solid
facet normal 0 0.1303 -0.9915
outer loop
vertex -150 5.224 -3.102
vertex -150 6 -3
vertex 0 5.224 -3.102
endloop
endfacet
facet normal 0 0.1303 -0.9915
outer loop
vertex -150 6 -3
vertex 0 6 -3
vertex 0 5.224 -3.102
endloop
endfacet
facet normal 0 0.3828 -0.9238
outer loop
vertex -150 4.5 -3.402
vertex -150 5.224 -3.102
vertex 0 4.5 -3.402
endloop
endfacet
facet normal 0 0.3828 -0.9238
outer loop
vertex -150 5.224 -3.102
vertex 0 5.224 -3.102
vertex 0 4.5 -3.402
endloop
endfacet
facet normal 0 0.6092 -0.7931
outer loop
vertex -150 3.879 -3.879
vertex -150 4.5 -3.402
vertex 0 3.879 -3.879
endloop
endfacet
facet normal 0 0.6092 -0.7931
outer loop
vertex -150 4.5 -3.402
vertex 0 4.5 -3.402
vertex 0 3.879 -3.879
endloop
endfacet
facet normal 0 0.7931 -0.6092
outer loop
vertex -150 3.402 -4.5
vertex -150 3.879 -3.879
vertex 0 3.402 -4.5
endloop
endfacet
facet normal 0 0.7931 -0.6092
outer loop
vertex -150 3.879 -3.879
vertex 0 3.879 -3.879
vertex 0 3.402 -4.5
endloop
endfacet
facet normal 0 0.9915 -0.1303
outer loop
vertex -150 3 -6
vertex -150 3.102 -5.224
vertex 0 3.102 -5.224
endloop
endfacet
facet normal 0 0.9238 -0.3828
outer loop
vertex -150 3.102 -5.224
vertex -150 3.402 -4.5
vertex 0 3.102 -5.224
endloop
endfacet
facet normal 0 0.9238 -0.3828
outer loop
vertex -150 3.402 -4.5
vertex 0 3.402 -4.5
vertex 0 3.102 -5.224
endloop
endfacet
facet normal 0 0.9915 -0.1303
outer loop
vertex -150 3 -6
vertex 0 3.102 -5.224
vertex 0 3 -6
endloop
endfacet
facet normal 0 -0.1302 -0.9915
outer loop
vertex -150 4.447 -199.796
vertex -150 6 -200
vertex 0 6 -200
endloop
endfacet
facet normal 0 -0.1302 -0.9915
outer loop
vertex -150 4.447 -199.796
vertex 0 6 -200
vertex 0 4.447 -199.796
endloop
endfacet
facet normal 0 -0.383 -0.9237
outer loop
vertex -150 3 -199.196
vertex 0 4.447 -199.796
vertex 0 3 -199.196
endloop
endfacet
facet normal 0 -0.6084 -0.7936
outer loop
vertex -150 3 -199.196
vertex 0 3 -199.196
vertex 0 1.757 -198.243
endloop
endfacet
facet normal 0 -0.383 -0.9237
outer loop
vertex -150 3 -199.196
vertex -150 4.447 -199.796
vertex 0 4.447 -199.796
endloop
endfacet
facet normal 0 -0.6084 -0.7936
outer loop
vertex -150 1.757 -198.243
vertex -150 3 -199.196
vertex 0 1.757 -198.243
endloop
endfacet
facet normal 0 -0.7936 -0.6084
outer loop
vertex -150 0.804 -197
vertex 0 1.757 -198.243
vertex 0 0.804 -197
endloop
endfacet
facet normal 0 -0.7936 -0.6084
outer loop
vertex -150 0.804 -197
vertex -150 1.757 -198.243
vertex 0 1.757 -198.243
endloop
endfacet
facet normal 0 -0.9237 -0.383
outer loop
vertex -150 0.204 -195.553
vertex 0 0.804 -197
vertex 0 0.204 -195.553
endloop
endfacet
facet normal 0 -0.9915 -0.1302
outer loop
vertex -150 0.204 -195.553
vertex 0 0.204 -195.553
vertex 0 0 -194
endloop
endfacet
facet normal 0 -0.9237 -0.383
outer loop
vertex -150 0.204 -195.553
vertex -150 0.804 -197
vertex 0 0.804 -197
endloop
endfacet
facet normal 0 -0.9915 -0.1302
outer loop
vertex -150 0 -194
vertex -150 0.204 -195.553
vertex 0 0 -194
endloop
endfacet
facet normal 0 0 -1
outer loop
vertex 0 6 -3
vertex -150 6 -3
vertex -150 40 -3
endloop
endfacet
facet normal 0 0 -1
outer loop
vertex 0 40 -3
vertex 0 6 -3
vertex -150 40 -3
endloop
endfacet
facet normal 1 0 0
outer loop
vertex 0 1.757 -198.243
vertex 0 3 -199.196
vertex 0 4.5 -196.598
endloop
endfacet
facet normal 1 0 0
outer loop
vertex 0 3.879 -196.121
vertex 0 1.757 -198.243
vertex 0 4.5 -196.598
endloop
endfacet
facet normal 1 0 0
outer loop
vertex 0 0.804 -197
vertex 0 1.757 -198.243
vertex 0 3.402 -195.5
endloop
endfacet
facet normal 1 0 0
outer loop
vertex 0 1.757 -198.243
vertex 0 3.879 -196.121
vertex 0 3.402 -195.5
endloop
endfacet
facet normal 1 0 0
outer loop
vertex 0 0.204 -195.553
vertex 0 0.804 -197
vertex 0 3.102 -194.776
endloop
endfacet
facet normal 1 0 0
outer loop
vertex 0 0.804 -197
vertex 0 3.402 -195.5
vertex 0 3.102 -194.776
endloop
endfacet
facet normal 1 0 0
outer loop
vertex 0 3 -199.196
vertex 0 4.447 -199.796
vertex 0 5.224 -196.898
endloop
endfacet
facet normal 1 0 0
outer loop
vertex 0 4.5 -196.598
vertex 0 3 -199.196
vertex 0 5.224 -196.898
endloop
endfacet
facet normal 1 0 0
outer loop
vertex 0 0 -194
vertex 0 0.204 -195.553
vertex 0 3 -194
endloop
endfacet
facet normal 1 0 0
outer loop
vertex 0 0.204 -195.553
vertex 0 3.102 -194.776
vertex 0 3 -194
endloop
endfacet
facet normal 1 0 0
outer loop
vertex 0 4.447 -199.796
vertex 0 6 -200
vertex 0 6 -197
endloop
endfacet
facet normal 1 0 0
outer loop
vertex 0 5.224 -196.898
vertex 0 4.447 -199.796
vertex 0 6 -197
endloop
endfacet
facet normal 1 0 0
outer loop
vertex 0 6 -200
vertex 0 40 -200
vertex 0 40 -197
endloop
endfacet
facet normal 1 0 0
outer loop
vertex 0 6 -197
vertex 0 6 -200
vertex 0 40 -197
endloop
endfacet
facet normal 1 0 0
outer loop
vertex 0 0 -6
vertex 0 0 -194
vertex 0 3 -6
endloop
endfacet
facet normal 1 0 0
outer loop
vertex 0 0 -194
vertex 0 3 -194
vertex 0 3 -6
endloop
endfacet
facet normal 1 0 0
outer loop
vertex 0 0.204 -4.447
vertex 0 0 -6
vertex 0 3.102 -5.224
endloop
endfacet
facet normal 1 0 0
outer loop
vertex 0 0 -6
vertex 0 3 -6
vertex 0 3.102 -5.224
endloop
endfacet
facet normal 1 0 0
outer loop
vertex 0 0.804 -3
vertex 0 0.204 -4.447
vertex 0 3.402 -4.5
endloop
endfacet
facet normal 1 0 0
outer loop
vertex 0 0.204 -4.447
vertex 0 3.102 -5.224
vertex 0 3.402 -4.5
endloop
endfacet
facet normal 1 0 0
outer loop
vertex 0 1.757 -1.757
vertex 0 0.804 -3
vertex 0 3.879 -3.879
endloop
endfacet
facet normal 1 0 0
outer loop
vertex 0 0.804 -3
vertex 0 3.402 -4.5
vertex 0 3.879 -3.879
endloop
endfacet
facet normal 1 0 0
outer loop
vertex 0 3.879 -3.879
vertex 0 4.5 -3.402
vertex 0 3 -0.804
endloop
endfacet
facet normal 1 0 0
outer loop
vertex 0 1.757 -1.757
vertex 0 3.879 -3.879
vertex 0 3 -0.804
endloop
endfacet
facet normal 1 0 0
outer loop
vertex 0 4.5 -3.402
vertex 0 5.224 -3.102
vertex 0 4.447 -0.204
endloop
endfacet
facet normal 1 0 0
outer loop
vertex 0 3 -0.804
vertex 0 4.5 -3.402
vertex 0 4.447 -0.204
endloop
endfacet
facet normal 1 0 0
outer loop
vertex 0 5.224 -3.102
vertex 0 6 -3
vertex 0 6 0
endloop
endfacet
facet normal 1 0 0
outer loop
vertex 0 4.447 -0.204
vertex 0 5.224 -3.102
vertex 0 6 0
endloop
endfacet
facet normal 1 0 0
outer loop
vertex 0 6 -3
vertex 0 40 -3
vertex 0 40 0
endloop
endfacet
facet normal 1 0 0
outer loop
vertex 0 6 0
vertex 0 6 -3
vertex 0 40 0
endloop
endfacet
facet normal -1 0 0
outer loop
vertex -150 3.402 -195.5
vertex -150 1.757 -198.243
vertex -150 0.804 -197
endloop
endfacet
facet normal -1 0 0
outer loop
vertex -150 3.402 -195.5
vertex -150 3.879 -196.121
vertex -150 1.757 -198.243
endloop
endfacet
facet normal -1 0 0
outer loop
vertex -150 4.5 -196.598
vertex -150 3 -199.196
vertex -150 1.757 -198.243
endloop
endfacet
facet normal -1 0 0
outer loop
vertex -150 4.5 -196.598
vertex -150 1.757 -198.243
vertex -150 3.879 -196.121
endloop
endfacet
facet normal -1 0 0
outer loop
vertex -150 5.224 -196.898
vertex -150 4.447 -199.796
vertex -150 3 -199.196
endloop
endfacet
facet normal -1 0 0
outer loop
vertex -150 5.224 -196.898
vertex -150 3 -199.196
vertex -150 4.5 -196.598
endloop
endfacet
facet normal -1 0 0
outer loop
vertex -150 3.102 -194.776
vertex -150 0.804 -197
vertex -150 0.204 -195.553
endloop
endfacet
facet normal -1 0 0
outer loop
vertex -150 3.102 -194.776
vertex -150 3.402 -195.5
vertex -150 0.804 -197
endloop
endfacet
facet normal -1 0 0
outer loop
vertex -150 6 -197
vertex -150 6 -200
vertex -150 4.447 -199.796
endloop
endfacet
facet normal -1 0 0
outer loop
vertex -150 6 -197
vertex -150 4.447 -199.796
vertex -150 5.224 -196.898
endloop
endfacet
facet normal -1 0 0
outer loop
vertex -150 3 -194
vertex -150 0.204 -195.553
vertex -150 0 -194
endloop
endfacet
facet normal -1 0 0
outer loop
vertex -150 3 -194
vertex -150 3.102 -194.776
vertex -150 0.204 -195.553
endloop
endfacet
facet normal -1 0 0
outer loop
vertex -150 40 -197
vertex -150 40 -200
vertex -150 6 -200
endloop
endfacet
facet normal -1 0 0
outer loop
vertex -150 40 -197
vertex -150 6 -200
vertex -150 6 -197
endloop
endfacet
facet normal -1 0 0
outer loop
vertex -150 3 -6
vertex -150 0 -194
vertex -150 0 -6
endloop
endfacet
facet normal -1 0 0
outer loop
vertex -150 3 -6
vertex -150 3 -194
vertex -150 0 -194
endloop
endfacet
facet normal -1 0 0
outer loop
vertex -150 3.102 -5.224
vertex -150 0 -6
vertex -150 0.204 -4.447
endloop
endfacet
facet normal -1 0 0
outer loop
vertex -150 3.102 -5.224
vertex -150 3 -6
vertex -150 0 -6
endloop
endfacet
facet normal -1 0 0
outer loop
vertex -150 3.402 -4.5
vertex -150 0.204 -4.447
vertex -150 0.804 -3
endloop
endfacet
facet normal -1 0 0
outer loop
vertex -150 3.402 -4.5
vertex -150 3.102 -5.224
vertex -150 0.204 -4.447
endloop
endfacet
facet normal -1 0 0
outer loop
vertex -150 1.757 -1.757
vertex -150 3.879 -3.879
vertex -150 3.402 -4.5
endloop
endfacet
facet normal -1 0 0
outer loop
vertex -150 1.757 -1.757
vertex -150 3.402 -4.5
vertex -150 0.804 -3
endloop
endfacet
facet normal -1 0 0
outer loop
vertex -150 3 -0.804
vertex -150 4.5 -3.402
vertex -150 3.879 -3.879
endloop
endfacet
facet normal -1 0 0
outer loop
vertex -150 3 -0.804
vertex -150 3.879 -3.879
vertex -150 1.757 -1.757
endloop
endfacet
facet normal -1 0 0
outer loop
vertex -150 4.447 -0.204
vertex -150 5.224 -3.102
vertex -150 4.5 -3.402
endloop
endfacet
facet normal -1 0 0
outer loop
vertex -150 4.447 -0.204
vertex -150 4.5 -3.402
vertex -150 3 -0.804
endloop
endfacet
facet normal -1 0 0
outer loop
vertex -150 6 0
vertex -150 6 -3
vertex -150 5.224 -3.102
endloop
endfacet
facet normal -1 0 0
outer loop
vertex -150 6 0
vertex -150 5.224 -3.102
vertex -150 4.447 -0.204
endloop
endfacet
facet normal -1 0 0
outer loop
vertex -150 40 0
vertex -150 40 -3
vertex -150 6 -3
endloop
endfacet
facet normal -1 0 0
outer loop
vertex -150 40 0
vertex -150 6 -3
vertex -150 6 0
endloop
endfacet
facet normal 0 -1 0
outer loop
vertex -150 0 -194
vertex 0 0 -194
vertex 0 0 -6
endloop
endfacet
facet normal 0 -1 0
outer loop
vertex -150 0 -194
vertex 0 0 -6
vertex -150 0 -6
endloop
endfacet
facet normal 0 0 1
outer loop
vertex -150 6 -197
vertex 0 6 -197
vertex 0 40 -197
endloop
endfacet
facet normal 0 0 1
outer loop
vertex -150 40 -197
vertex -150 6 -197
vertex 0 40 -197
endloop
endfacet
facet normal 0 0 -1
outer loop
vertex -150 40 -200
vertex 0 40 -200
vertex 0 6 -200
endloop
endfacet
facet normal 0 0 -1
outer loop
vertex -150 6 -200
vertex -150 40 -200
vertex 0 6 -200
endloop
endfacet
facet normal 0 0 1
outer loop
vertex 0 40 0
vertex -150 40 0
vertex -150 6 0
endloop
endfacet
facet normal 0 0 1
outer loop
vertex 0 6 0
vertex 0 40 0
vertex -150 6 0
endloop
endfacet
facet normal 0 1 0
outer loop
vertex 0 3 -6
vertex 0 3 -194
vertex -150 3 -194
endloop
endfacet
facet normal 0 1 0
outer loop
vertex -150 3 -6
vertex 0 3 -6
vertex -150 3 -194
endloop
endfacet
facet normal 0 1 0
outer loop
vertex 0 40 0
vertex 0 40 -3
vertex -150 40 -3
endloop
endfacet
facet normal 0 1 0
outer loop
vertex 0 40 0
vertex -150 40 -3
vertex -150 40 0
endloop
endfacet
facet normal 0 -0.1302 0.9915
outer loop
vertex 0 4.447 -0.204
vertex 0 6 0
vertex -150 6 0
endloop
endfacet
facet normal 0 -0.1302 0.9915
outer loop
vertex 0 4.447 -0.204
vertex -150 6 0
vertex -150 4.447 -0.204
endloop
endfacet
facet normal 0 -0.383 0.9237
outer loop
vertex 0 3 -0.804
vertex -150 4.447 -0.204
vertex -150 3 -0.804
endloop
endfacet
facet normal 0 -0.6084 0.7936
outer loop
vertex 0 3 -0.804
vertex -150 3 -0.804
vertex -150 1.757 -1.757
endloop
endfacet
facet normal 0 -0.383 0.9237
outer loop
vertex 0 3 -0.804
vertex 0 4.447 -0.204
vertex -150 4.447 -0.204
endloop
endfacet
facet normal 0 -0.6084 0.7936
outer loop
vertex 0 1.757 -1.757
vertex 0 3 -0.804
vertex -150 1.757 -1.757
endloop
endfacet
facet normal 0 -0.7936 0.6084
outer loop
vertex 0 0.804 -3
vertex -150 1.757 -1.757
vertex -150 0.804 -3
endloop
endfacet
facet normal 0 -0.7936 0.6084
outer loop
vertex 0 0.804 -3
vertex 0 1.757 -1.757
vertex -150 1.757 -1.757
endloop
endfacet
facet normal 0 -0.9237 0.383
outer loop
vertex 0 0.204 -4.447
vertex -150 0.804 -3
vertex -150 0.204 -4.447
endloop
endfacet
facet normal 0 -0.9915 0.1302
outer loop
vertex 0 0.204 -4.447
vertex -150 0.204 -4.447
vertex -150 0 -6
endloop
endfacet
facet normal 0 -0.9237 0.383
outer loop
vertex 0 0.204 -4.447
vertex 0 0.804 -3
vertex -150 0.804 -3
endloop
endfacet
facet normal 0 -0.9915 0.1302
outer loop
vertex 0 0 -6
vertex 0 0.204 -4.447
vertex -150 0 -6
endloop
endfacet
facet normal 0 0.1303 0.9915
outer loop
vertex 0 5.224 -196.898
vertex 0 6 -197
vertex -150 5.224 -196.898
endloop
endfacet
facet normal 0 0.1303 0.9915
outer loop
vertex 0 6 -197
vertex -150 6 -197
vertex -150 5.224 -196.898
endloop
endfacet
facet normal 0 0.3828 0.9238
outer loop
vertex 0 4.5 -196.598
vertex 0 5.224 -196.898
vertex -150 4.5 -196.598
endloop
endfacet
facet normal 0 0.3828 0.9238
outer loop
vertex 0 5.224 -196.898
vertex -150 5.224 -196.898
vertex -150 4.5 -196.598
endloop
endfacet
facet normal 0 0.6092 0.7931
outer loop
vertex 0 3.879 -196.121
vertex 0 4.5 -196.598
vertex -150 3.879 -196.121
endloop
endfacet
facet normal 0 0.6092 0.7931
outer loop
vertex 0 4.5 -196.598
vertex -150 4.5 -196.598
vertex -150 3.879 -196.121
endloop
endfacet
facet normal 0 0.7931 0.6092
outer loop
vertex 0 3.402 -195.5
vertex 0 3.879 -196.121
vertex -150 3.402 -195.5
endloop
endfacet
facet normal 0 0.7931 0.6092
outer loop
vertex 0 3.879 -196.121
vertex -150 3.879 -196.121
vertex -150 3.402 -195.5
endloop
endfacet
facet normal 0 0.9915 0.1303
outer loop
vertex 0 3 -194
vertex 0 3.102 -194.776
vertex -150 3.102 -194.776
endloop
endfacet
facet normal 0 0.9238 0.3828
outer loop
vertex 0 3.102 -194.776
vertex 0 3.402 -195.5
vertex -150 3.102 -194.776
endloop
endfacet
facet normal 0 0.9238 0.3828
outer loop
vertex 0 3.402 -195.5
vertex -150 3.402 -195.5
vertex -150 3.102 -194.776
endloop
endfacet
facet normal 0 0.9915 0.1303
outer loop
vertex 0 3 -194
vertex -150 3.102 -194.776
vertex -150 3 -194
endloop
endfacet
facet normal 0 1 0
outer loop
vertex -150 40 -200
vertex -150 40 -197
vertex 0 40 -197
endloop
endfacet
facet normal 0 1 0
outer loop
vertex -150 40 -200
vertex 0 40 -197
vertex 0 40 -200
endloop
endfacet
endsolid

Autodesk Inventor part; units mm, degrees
ref_plane "YZ Plane" through (0, 0, 0) normal (1, 0, 0) x (0, 1, 0)
ref_plane "XZ Plane" through (0, 0, 0) normal (0, 1, 0) x (-1, 0, 0)
ref_plane "XY Plane" through (0, 0, 0) normal (0, 0, 1) x (1, 0, 0)
sketch "Sketch1" plane through (0, 0, 0) normal (0, 1, 0) x (-1, 0, 0)
  line L0 (0, 0) -> (150, 0)
  line L1 (150, 0) -> (150, -200)
  line L2 (150, -200) -> (0, -200)
  line L3 (0, -200) -> (0, 0)
  dimension "d0" = 200
  dimension "d1" = 150
extrude "Plate1" add sketch "Sketch1" along normal blind 3
sketch "Sketch2" plane through (0, 0, -3) normal (0, 0, 1) x (1, 0, 0)
  line L0 (-150, 0) -> (0, 0)
  line L1 (0, 0) -> (0, 40)
  line L2 (0, 40) -> (-150, 40)
  line L3 (-150, 40) -> (-150, 0)
edge flange "Flange1" height 40 angle 90 thickness 3 bend radius 3 thickness toward (0, 0, 1) relief tear relief width 3 relief depth 1.5 edges at (-75, 3, 0) wall of the first edge with corners at (-150, 0, -3) (0, 0, -3) (0, 40, -3) (-150, 40, -3)
bend "Bend1"
corner "Corner1"
sketch "Sketch3" plane through (-150, 0, -197) normal (0, 0, -1) x (-1, 0, 0)
  line L0 (-150, 0) -> (0, 0)
  line L1 (0, 0) -> (0, 40)
  line L2 (0, 40) -> (-150, 40)
  line L3 (-150, 40) -> (-150, 0)
edge flange "Flange2" height 40 angle 90 thickness 3 bend radius 3 thickness toward (0, 0, -1) relief tear relief width 3 relief depth 1.5 edges at (-75, 3, -200) wall of the first edge with corners at (0, 0, -197) (-150, 0, -197) (-150, 40, -197) (0, 40, -197)
bend "Bend2"
corner "Corner2"
equation "\"d2\" = Thickness"
equation "\"d3\" = BendReliefWidth"
equation "\"d4\" = BendReliefDepth"
equation "\"d5\" = MinimumRemnant"
equation "\"d6\" = TransitionRadius"
equation "\"d9\" = BendRadius"
equation "\"d10\" = CornerReliefSize"
equation "\"d11\" = GapSize"
equation "\"d12\" = JacobiRadiusSize"
equation "\"d13\" = BendReliefWidth"
equation "\"d14\" = BendReliefDepth"
equation "\"d15\" = MinimumRemnant"
equation "\"d16\" = TransitionRadius"
equation "\"d19\" = BendRadius"
equation "\"d20\" = CornerReliefSize"
equation "\"d21\" = GapSize"
equation "\"d22\" = JacobiRadiusSize"
equation "\"BendRadius\" = Thickness"
equation "\"BendReliefWidth\" = Thickness"
equation "\"BendReliefDepth\" = 0.5 * Thickness"
equation "\"CornerReliefSize\" = 4 * Thickness"
equation "\"MinimumRemnant\" = 2 * Thickness"
equation "\"TransitionRadius\" = BendRadius"
equation "\"JacobiRadiusSize\" = BendRadius"
equation "\"GapSize\" = Thickness"
equation "\"Thickness\" = 3"
properties part number "floor" material "Aluminum 6061"
